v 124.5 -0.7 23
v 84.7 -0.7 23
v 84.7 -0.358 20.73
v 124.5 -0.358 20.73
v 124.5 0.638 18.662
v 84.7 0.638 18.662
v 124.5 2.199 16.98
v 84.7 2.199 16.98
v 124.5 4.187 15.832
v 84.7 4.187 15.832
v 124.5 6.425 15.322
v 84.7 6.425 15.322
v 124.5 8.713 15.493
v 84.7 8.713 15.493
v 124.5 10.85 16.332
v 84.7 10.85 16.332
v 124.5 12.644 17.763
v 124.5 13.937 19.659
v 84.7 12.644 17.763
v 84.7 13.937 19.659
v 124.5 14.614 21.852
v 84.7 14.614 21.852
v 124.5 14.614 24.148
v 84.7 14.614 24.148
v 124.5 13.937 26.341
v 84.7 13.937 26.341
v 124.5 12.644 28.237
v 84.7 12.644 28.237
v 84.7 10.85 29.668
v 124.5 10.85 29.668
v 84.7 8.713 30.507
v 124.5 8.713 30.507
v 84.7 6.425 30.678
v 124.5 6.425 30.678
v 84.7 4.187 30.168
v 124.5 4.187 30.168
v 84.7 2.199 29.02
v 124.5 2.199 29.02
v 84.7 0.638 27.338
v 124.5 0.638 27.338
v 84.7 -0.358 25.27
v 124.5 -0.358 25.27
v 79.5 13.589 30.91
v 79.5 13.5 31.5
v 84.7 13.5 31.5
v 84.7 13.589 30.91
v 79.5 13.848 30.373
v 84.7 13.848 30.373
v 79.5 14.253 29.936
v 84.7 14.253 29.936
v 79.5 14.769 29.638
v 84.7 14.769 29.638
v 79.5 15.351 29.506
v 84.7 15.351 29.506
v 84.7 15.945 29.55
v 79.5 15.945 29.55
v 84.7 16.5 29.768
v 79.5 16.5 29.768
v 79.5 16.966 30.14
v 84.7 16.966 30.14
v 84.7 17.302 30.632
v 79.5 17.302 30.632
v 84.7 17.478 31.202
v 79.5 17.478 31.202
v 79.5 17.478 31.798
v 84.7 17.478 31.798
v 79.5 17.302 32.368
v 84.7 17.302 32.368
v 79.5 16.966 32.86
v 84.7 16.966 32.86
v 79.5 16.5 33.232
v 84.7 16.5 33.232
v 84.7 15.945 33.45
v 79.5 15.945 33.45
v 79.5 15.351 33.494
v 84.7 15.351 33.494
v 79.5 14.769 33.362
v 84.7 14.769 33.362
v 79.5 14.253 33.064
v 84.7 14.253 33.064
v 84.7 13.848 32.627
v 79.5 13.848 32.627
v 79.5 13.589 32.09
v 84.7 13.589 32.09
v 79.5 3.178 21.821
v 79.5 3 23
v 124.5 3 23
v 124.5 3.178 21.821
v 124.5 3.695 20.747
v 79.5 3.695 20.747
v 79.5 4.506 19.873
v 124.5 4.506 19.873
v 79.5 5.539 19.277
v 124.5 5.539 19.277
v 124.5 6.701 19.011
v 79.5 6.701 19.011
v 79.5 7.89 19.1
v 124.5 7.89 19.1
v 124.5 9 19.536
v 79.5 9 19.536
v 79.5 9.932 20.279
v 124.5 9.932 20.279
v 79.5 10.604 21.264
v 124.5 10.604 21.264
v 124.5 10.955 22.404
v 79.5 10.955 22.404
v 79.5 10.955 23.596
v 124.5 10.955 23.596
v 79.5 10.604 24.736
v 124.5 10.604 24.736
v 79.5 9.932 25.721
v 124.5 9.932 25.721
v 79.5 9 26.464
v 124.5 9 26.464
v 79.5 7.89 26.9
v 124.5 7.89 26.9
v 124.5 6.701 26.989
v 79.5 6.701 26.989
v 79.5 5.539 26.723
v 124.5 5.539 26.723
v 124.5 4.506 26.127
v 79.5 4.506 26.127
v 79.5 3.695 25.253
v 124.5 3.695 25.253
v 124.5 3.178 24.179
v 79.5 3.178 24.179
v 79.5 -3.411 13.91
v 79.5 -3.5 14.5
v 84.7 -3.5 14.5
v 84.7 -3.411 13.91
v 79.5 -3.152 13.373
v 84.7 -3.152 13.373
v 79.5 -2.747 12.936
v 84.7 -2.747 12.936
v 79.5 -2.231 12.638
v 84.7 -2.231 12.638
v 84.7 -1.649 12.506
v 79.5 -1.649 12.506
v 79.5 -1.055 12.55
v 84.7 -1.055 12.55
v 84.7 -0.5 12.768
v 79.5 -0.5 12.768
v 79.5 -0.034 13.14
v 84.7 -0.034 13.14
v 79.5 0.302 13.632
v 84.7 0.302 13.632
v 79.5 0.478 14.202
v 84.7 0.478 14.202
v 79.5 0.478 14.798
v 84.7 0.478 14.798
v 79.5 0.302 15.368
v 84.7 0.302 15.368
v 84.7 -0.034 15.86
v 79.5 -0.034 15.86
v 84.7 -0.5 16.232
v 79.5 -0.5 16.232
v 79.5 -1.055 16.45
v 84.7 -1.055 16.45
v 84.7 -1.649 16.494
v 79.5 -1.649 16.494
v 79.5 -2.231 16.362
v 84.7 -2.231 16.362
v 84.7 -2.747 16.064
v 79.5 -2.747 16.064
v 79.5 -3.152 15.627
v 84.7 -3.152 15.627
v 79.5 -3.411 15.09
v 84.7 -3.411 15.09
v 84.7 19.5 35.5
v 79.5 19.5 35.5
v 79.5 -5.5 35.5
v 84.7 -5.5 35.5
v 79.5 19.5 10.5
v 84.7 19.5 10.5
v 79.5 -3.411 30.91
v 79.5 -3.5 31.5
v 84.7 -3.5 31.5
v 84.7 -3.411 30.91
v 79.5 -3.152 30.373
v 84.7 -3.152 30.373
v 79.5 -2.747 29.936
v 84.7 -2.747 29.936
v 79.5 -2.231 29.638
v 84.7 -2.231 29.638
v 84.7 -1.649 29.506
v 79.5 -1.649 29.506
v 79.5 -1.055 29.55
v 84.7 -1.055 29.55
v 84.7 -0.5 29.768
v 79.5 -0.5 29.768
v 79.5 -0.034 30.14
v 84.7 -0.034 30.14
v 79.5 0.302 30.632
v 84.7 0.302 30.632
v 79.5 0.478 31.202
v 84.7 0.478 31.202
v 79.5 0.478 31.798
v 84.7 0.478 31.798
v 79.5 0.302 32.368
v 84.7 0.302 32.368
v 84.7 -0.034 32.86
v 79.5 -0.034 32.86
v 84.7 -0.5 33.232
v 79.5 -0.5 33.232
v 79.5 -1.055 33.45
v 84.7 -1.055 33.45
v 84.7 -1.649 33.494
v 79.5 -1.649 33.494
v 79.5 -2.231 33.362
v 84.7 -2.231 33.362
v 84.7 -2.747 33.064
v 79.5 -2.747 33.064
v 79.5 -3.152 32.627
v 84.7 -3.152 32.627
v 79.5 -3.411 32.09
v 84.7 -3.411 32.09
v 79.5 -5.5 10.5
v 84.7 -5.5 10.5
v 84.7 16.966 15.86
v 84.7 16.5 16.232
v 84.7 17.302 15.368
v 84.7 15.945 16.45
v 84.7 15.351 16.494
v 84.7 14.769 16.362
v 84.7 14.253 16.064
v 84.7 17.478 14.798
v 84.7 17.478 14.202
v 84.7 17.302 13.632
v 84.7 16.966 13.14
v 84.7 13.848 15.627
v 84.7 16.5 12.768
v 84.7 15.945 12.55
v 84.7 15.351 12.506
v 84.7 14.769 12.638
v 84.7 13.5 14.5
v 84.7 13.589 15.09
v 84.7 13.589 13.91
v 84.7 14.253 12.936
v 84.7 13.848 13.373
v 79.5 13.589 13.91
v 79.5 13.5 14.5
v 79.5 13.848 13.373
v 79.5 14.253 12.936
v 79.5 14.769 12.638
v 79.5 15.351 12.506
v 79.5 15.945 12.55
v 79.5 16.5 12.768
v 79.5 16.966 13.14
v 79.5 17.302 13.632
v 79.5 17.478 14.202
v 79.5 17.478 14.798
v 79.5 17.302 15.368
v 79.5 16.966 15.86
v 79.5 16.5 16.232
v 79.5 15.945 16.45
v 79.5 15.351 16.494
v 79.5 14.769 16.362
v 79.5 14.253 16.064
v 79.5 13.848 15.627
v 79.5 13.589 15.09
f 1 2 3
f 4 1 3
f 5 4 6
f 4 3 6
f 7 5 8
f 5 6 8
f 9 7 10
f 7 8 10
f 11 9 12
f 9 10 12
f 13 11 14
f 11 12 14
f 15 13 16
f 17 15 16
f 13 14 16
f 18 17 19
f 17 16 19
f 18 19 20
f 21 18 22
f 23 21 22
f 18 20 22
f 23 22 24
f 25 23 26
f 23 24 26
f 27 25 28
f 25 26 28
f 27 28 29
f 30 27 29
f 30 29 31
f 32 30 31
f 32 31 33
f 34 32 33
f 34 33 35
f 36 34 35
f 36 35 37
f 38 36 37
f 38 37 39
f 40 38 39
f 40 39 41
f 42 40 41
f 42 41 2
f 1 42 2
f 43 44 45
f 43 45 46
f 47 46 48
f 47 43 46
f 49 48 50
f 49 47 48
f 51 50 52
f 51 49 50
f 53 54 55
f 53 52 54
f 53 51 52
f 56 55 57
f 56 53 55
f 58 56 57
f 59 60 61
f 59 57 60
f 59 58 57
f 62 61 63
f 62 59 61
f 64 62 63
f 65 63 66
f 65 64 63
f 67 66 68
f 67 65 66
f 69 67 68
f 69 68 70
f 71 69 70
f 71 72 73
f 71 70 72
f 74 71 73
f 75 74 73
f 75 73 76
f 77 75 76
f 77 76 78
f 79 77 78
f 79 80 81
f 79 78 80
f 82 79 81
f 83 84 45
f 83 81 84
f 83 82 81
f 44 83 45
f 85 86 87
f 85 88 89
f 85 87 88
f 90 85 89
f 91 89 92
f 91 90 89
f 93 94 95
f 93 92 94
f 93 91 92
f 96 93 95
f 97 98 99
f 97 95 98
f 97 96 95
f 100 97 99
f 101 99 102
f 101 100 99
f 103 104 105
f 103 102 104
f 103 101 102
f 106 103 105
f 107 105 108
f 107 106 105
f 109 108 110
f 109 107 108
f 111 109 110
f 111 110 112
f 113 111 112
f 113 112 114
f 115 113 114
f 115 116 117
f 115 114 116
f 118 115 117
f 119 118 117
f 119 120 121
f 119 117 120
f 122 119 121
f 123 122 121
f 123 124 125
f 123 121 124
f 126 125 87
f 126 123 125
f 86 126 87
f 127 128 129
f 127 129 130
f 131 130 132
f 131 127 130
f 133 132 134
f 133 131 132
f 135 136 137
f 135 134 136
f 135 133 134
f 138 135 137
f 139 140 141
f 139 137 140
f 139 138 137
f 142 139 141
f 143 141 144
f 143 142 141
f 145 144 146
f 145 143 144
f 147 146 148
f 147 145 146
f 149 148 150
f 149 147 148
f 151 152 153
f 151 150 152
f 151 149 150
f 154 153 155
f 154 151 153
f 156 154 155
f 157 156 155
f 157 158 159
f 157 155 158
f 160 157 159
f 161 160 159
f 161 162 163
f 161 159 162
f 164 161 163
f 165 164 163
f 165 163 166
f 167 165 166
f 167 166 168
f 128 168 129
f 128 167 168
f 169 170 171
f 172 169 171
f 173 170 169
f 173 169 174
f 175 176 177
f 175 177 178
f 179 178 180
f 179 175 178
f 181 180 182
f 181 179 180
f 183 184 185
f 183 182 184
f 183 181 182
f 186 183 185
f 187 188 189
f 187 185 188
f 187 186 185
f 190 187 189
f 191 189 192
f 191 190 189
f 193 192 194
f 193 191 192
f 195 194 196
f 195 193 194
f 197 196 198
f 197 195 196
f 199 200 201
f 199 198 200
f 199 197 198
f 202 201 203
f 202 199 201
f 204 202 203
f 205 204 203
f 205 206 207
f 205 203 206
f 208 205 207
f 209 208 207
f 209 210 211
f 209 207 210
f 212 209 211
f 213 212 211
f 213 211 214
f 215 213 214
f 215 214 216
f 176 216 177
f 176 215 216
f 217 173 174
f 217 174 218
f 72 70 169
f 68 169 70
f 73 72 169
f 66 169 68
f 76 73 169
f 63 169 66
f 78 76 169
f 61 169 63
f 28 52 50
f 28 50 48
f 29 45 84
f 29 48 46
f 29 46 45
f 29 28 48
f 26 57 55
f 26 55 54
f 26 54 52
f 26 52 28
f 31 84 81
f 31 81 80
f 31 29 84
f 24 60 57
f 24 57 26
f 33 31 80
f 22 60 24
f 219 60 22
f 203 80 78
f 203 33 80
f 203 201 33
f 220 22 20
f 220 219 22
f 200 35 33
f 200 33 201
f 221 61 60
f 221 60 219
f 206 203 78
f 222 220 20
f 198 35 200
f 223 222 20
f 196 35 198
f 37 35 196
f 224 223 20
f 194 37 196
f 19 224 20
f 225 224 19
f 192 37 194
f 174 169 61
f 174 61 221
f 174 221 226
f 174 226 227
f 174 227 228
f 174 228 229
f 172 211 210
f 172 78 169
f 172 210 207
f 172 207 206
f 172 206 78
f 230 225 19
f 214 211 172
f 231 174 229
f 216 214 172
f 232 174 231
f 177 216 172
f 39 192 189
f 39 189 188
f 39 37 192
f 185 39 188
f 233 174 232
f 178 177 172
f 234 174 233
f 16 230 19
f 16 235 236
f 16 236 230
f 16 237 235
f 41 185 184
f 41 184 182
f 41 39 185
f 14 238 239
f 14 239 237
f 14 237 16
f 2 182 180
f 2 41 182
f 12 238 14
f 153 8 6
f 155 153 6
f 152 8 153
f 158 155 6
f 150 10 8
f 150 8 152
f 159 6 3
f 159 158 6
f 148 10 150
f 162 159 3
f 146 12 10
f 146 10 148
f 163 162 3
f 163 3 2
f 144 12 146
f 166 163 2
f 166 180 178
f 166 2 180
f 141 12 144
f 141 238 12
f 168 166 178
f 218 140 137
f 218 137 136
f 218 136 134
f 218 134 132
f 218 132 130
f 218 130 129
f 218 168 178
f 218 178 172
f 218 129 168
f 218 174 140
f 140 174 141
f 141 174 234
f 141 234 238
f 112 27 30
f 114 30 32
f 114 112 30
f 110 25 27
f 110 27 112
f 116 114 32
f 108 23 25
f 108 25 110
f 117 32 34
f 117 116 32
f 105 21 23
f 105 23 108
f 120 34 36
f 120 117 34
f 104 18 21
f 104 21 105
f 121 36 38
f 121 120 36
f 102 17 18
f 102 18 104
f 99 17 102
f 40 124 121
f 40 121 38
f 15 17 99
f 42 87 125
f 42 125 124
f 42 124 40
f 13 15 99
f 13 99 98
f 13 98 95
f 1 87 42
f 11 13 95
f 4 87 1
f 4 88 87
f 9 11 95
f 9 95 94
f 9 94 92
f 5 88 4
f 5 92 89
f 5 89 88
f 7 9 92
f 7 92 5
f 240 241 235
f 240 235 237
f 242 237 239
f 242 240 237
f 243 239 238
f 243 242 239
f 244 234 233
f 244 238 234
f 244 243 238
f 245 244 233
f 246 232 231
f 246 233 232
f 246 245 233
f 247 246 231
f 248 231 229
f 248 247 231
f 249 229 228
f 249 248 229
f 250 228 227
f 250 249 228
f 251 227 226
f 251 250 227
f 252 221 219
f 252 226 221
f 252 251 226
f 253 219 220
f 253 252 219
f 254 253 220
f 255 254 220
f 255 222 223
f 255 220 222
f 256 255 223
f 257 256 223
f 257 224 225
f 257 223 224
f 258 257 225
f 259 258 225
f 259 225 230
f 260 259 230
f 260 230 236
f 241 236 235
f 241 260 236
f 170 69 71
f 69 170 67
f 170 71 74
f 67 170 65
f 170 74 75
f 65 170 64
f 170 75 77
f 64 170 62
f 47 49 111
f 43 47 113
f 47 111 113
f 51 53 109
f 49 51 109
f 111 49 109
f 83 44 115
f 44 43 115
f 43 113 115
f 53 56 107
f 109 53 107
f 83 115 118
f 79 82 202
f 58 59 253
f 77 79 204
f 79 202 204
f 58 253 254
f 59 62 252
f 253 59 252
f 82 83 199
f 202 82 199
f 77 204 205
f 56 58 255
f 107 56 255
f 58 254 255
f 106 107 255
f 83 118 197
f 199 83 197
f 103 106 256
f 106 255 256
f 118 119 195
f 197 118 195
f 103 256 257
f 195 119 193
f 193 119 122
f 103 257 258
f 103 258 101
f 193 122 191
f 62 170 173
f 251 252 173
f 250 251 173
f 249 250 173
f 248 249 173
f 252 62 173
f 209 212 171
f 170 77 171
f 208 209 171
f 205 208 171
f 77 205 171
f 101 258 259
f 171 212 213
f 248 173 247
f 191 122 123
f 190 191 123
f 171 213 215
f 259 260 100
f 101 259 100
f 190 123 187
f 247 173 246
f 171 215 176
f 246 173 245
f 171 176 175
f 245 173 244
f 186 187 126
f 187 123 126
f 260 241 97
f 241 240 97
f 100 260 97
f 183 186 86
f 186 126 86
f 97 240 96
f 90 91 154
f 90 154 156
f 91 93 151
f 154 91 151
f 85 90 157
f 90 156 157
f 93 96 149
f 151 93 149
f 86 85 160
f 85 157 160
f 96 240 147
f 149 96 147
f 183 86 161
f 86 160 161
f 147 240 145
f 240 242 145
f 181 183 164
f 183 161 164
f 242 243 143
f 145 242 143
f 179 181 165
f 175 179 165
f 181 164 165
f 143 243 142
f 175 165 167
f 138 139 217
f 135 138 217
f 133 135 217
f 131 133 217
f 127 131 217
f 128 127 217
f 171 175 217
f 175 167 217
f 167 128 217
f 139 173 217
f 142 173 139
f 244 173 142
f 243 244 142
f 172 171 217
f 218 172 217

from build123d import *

# Parameters (mm, degrees)
CYLINDER006_R          = 2
CYLINDER006_DEPTH      = 10
CYLINDER007_R          = 2
CYLINDER007_DEPTH      = 10
CYLINDER052_R          = 2
CYLINDER052_DEPTH      = 10
CYLINDER055_R          = 2
CYLINDER055_DEPTH      = 10
CYLINDER054_R          = 4
CYLINDER054_DEPTH      = 60
CYLINDER053_R          = 7.7
CYLINDER053_DEPTH      = 40
BOX019_W               = 25
BOX019_H               = 25
BOX019_DEPTH           = 5.2
CUT004_ROLL_ANGLE      = -90
CUT004_PLACEMENT_ANGLE = -90


with BuildPart() as cylinder006:
    # Cylinder006 → Cylinder006 (new body)
    with BuildSketch(Plane(origin=(21, 21, -2), x_dir=(1, 0, 0), z_dir=(0, 0, 1))):
        Circle(CYLINDER006_R)
    extrude(amount=CYLINDER006_DEPTH)


with BuildPart() as cylinder007:
    # Cylinder007 → Cylinder007 (new body)
    with BuildSketch(Plane(origin=(21, 4, -2), x_dir=(1, 0, 0), z_dir=(0, 0, 1))):
        Circle(CYLINDER007_R)
    extrude(amount=CYLINDER007_DEPTH)


with BuildPart() as cylinder052:
    # Cylinder052 → Cylinder052 (new body)
    with BuildSketch(Plane(origin=(4, 21, -2), x_dir=(1, 0, 0), z_dir=(0, 0, 1))):
        Circle(CYLINDER052_R)
    extrude(amount=CYLINDER052_DEPTH)


with BuildPart() as cylinder055:
    # Cylinder055 → Cylinder055 (new body)
    with BuildSketch(Plane(origin=(4, 4, -2), x_dir=(1, 0, 0), z_dir=(0, 0, 1))):
        Circle(CYLINDER055_R)
    extrude(amount=CYLINDER055_DEPTH)


with BuildPart() as cylinder054:
    # Cylinder054 → Cylinder054 (new body)
    with BuildSketch(Plane(origin=(12.5, 12.5, -7), x_dir=(1, 0, 0), z_dir=(0, 0, 1))):
        Circle(CYLINDER054_R)
    extrude(amount=CYLINDER054_DEPTH)


with BuildPart() as cylinder053:
    # Cylinder053 → Cylinder053 (new body)
    with BuildSketch(Plane(origin=(12.5, 12.5, 5), x_dir=(1, 0, 0), z_dir=(0, 0, 1))):
        Circle(CYLINDER053_R)
    extrude(amount=CYLINDER053_DEPTH)


with BuildPart() as cut004:
    # Box019 → Box019 (new body)
    with BuildSketch(Plane.XY):
        with Locations((12.5, 12.5)):
            Rectangle(BOX019_W, BOX019_H)
    extrude(amount=BOX019_DEPTH)

    # Fusion022: union Cylinder053
    add(cylinder053.part)

    # Cut: cut Cylinder054
    add(cylinder054.part, mode=Mode.SUBTRACT)

    # Cut001: cut Cylinder055
    add(cylinder055.part, mode=Mode.SUBTRACT)

    # Cut002: cut Cylinder052
    add(cylinder052.part, mode=Mode.SUBTRACT)

    # Cut003: cut Cylinder007
    add(cylinder007.part, mode=Mode.SUBTRACT)

    # Cut004: cut Cylinder006
    add(cylinder006.part, mode=Mode.SUBTRACT)


with BuildPart() as cut004_1:
    # Cut004 roll: moved
    add(cut004.part.rotate(Axis((0, 0, 0), (1, 0, 0)), CUT004_ROLL_ANGLE))


with BuildPart() as cut004_2:
    # Cut004 placement: moved
    add(cut004_1.part.moved(Location((79.5, 19.5, 35.5))).rotate(Axis((79.5, 19.5, 35.5), (0, 0, 1)), CUT004_PLACEMENT_ANGLE))


solid = cut004_2.part
